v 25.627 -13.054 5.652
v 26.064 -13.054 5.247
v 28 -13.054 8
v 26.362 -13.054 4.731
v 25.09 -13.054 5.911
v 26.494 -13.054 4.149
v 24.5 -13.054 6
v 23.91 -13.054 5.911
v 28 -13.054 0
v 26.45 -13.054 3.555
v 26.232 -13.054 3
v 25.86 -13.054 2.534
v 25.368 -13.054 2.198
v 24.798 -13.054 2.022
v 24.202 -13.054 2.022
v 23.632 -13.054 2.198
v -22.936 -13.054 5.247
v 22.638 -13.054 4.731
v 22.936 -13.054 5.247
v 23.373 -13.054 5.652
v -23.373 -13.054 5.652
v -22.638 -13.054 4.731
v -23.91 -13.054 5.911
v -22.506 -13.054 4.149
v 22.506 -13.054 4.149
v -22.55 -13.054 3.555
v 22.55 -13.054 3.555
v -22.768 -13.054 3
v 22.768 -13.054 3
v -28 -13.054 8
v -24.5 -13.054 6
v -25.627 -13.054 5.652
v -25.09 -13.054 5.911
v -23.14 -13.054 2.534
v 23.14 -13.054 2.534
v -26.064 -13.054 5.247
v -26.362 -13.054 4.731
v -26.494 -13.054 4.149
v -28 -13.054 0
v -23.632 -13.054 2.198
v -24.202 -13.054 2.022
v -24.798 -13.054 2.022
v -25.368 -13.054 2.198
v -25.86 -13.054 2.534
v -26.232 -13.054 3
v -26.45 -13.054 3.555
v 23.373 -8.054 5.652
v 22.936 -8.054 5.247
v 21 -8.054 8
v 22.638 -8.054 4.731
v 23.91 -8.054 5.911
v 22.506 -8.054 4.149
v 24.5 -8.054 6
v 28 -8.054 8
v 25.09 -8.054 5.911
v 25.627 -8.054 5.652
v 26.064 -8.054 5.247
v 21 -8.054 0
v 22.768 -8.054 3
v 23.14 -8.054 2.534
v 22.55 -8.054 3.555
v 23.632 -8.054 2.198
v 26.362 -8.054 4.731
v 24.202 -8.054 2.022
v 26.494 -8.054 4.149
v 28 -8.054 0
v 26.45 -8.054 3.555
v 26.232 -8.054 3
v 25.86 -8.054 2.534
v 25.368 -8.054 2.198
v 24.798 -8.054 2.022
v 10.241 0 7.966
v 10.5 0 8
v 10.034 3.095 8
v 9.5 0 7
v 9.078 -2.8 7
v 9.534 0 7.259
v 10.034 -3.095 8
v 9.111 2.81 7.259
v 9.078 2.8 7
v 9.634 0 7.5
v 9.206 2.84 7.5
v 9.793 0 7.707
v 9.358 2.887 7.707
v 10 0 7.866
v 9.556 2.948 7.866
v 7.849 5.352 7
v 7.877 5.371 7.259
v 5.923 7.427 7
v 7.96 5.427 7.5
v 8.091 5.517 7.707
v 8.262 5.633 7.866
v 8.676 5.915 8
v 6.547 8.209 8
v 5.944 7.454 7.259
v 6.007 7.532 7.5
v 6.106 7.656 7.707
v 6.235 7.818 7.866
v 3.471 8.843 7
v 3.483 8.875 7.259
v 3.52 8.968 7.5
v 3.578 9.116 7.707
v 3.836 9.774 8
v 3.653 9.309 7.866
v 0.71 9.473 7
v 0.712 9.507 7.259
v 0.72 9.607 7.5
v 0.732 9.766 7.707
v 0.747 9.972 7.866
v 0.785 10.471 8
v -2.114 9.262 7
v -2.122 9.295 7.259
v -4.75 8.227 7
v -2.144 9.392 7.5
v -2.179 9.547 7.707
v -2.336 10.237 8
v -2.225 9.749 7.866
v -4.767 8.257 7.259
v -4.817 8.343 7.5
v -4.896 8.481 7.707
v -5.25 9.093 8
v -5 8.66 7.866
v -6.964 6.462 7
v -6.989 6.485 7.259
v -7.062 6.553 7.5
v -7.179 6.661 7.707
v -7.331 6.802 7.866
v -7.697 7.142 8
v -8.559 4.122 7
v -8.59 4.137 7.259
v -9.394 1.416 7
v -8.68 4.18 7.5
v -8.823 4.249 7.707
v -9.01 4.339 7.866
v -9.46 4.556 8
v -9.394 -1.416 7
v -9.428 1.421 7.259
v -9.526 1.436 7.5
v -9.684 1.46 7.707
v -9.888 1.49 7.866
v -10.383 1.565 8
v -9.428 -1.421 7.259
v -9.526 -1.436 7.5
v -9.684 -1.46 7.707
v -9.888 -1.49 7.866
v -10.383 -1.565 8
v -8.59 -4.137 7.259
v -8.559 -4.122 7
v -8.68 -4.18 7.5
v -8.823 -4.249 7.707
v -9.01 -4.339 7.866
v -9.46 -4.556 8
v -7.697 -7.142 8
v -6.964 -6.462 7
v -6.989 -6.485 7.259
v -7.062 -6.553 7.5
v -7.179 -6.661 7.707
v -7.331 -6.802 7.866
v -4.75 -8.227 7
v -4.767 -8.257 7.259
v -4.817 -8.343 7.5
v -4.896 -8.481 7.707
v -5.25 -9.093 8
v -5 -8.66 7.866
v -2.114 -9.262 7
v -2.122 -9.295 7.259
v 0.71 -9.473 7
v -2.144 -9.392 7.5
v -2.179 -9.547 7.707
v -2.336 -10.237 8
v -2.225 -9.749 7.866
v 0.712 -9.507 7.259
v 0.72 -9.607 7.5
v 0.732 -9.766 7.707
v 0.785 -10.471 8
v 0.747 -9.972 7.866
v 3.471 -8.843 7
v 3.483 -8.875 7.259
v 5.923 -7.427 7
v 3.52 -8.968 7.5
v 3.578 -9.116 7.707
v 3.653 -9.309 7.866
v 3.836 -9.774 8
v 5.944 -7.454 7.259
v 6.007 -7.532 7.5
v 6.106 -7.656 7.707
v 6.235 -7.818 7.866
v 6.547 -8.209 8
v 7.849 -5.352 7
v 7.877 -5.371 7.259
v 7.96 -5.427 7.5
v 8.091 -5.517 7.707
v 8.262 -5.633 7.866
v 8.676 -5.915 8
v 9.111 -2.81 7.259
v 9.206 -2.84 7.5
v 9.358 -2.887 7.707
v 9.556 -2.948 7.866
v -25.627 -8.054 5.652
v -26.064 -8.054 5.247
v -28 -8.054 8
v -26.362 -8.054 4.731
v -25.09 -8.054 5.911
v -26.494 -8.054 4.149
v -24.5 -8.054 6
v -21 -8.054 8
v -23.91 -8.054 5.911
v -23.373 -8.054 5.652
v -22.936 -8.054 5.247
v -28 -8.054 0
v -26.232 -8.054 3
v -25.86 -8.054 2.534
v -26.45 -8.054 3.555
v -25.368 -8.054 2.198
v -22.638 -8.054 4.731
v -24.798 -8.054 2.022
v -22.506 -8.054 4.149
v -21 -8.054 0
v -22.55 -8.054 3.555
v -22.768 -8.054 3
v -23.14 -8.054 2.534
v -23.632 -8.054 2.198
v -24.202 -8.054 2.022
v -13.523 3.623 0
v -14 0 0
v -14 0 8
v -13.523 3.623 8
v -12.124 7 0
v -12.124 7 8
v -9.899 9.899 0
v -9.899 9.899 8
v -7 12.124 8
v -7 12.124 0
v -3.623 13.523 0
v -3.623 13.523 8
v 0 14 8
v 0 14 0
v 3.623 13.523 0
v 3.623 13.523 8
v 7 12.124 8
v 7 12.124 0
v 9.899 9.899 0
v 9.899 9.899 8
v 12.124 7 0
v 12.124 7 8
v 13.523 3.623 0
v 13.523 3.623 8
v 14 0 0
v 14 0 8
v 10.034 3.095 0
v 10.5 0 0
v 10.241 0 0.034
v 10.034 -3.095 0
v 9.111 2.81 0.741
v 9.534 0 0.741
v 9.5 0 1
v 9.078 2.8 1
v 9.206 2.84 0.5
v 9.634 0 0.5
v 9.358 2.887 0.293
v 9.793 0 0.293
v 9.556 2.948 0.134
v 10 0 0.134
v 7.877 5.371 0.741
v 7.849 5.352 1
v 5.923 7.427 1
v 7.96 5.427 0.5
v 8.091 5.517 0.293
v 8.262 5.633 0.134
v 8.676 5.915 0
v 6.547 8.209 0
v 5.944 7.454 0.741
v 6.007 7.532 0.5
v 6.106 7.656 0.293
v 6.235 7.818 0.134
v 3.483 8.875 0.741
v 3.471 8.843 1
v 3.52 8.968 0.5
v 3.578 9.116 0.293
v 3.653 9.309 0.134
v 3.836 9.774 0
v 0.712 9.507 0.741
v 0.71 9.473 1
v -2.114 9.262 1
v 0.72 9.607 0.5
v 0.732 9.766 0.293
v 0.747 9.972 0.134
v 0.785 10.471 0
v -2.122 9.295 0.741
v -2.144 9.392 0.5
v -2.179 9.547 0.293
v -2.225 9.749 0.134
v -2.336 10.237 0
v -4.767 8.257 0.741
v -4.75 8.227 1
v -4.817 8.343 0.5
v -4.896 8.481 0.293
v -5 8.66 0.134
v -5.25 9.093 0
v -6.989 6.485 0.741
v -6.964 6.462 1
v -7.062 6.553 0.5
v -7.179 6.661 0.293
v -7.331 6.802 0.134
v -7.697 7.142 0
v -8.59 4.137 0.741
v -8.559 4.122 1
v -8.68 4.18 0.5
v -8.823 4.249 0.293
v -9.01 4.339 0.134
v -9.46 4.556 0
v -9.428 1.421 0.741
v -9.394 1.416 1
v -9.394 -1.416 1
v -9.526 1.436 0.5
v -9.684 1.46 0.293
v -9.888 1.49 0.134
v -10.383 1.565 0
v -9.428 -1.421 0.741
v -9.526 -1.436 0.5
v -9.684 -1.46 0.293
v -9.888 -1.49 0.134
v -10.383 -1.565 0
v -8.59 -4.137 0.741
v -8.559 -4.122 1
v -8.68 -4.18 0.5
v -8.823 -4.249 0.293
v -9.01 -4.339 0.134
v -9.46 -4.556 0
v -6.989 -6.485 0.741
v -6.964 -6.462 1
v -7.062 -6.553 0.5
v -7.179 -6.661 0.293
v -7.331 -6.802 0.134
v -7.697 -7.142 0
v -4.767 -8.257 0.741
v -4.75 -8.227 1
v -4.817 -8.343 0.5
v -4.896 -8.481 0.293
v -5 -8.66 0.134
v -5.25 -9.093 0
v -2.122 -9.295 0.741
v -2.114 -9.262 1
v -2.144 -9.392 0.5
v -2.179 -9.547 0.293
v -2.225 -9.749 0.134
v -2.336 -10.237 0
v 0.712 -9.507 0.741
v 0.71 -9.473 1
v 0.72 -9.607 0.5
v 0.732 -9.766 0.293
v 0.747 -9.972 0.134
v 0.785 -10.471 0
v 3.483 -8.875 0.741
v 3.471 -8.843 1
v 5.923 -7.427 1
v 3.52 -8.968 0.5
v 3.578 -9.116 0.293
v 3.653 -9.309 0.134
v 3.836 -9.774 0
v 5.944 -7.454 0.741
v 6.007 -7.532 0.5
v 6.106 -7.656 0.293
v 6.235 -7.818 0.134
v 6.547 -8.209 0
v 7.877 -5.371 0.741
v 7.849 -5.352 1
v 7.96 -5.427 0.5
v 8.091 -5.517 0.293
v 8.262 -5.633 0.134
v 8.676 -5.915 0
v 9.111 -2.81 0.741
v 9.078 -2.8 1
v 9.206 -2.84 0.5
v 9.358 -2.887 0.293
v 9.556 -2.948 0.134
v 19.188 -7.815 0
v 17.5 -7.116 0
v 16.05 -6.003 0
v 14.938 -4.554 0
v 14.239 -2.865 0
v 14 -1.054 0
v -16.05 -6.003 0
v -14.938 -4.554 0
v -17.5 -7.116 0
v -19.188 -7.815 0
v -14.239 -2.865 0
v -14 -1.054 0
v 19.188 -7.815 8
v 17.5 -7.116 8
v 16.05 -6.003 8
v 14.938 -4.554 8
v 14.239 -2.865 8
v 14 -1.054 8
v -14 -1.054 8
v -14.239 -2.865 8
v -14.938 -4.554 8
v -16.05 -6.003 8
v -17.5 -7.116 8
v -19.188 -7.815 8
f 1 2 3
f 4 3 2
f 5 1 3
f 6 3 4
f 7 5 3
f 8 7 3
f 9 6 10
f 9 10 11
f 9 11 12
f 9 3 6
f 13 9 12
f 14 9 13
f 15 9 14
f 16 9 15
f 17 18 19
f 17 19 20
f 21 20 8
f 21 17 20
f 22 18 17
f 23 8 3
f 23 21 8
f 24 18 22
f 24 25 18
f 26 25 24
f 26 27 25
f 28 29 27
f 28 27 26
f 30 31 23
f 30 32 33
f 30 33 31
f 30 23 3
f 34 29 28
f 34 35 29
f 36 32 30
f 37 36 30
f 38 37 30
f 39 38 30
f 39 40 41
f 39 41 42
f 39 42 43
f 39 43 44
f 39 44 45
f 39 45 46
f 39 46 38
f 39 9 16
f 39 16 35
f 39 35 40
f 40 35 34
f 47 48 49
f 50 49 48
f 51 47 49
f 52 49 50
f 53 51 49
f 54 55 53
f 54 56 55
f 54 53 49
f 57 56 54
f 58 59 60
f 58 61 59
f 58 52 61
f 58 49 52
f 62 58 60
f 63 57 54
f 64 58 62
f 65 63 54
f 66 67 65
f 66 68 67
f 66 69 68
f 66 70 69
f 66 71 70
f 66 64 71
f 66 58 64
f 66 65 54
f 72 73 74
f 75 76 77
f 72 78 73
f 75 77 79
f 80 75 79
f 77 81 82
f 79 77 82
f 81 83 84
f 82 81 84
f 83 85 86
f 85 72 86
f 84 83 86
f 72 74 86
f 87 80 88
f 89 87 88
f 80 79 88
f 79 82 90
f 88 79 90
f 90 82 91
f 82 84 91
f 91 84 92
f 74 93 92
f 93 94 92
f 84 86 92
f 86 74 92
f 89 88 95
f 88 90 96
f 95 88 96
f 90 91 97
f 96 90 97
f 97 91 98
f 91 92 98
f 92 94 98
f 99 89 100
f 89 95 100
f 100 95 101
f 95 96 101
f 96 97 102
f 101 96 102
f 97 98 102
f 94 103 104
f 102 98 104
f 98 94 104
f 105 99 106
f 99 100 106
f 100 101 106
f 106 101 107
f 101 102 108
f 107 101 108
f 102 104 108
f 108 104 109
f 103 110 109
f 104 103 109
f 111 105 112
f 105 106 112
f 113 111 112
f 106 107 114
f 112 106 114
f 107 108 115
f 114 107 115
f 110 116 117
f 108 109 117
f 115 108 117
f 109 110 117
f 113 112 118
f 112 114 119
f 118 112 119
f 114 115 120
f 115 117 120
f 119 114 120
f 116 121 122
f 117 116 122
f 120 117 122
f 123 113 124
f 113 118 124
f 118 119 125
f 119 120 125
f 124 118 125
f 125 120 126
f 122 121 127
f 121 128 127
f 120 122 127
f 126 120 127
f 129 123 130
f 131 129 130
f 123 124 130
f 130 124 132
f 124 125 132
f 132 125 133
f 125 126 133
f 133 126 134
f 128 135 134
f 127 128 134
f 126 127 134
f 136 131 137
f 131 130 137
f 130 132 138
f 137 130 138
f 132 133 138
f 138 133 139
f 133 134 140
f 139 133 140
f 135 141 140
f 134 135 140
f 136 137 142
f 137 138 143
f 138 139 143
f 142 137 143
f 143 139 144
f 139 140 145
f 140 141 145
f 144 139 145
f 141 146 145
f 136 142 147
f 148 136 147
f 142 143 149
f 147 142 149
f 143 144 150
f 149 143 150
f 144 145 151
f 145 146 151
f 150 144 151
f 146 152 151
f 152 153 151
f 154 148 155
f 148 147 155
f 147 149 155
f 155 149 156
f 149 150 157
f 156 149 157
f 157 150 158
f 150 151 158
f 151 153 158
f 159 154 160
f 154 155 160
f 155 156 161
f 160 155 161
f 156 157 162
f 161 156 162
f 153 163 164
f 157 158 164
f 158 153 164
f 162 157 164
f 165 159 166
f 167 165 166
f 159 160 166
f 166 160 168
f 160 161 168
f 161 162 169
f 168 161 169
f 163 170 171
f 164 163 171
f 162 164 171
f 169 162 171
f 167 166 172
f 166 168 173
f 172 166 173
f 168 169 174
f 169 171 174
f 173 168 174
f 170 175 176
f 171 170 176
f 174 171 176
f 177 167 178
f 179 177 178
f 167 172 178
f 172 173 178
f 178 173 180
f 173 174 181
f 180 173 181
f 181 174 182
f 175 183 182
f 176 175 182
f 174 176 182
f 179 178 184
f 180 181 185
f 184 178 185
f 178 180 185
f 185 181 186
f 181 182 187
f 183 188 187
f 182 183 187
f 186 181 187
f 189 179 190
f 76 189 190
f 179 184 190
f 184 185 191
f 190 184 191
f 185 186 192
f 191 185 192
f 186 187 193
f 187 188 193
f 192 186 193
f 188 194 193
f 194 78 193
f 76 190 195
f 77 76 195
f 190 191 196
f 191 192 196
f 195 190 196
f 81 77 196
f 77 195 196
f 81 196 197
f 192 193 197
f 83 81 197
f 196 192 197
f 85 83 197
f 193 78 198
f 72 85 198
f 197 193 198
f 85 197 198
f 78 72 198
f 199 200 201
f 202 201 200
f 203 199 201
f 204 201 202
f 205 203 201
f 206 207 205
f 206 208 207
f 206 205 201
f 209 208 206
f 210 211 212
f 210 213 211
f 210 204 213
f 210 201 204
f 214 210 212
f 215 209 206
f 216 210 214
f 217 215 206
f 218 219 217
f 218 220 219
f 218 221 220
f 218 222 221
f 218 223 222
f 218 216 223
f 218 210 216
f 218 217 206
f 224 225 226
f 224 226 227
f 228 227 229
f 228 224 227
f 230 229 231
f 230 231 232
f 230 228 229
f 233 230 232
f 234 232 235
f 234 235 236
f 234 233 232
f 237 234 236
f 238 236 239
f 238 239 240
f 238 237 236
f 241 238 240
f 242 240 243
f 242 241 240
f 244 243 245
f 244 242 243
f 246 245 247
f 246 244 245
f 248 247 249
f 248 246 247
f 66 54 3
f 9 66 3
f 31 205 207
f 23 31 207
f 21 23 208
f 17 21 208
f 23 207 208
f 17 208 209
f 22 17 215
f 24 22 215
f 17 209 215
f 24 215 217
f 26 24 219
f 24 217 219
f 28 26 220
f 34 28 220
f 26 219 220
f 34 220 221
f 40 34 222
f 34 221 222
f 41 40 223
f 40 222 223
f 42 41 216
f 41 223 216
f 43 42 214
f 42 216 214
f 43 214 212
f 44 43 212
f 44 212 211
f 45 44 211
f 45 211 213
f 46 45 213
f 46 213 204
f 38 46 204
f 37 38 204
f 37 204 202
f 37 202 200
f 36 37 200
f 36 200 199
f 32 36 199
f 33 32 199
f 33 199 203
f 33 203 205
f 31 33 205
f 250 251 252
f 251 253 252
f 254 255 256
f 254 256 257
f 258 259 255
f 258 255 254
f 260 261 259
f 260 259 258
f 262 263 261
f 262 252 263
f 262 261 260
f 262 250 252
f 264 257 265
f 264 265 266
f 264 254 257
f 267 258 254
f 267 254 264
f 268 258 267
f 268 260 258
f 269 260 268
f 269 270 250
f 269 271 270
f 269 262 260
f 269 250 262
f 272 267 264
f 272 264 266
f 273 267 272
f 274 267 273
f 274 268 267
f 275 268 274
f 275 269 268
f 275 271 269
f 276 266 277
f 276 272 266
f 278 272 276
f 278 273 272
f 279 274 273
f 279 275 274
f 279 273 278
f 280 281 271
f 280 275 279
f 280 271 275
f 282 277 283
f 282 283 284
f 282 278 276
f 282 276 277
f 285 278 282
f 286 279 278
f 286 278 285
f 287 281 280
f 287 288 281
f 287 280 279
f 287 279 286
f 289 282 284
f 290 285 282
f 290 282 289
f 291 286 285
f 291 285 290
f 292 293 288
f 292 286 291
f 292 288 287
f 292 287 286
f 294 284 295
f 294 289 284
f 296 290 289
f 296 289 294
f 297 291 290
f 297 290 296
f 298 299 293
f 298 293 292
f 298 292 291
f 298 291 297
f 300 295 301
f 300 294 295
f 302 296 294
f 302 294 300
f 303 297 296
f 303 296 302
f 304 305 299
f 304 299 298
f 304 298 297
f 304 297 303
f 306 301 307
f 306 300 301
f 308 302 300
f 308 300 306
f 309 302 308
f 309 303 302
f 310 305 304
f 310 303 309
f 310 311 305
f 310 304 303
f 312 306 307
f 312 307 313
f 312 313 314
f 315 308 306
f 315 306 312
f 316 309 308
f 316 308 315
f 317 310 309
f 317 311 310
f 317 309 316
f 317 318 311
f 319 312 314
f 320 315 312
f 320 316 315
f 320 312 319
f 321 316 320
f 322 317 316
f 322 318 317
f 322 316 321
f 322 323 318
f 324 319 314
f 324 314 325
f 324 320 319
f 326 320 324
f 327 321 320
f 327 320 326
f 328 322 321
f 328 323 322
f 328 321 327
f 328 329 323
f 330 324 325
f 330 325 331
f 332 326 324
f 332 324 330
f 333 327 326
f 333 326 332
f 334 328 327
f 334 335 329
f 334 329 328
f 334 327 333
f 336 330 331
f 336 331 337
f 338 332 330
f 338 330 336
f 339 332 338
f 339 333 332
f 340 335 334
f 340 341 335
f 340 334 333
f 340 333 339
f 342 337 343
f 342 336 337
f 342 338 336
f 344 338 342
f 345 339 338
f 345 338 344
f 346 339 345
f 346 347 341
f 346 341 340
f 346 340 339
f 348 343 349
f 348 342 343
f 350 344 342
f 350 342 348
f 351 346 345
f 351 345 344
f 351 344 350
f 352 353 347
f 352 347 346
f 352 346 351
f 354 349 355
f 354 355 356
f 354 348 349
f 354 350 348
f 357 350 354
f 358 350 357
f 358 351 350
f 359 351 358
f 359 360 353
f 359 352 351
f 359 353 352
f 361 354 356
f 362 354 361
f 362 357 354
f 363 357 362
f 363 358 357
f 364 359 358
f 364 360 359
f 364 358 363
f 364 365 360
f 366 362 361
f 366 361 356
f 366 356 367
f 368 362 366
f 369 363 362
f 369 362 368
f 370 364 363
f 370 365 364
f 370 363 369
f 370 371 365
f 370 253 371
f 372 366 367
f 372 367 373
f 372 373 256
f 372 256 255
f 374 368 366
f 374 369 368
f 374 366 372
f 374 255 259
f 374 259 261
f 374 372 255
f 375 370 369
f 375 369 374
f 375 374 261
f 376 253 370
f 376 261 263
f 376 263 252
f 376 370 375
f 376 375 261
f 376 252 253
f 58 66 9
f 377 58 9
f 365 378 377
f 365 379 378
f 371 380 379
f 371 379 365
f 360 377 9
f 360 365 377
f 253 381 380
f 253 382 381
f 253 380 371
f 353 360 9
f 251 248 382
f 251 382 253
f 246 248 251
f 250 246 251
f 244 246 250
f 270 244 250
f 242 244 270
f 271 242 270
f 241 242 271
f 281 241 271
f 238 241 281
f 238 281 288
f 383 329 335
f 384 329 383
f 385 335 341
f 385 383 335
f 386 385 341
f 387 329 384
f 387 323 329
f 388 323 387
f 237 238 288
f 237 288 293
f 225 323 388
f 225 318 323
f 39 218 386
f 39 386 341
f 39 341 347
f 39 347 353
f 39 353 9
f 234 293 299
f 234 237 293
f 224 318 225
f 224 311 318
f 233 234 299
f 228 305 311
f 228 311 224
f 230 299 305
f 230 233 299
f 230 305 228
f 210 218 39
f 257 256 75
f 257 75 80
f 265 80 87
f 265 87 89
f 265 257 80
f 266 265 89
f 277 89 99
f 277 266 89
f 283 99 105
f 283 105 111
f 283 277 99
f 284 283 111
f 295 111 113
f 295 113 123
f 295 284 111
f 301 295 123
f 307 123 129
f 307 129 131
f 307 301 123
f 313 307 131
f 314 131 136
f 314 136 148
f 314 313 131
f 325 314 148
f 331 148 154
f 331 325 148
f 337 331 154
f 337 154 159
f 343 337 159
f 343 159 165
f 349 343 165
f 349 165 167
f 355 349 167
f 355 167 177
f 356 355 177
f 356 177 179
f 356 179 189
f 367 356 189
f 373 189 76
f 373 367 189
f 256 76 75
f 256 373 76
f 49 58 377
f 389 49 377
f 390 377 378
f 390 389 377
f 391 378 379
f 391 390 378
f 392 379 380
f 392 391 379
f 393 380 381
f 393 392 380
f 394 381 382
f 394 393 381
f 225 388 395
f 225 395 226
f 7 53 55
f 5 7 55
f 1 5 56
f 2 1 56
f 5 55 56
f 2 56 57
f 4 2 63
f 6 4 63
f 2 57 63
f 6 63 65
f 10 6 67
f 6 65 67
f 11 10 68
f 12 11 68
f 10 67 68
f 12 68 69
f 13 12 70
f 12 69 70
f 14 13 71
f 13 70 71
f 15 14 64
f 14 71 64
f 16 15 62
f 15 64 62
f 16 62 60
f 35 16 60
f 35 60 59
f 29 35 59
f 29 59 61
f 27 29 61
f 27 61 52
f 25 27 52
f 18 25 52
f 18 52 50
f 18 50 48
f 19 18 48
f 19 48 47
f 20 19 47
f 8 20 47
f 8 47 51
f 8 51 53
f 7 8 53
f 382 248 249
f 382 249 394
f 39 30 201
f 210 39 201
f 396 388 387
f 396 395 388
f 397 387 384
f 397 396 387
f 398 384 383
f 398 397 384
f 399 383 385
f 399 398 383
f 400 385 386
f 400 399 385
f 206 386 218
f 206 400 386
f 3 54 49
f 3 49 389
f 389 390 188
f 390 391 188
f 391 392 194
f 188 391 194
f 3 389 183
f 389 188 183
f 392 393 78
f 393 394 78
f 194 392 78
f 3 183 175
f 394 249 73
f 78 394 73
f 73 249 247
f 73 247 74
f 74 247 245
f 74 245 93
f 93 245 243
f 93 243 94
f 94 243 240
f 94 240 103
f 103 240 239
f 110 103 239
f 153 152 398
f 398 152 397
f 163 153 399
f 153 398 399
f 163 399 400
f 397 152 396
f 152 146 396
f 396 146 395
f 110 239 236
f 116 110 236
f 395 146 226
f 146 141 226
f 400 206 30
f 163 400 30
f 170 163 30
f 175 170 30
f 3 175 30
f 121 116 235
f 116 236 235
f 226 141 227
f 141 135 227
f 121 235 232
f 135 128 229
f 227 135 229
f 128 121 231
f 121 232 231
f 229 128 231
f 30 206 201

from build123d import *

# Parameters (mm, degrees)
ESQUISSE1_R             = 9.5
BOSS_EXTRU_1_DEPTH      = 8
CONG_1_R                = 1
CONG_2_R                = 1
CONG_3_R                = 7
ESQUISSE2_R             = 2
ENL_V_MAT_EXTRU_1_DEPTH = 6


with BuildPart() as part:
    # Esquisse1 → Boss.-Extru.1 (new body)
    with BuildSketch(Plane.XY):
        with BuildLine():
            Line((14, -8.053746339), (28, -8.053746339))
            Line((28, -8.053746339), (28, -13.053746339))
            Line((28, -13.053746339), (-28, -13.053746339))
            Line((-28, -13.053746339), (-28, -8.053746339))
            Line((-28, -8.053746339), (-14, -8.053746339))
            Line((-14, -8.053746339), (-14, 0))
            ThreePointArc((-14, 0), (0, 14), (14, 0))
            Line((14, 0), (14, -8.053746339))
        make_face()
        Circle(ESQUISSE1_R, mode=Mode.SUBTRACT)
    extrude(amount=BOSS_EXTRU_1_DEPTH)

    # Congé1
    cong_1_edges = [part.edges().sort_by_distance(p)[0] for p in [
        (-9.5, 0, 8),
    ]]
    fillet(cong_1_edges, radius=CONG_1_R)

    # Congé2
    cong_2_edges = [part.edges().sort_by_distance(p)[0] for p in [
        (-9.5, 0, 0),
    ]]
    fillet(cong_2_edges, radius=CONG_2_R)

    # Congé3
    cong_3_edges = [part.edges().sort_by_distance(p)[0] for p in [
        (-14, -8.053746339, 4),
        (14, -8.053746339, 4),
    ]]
    fillet(cong_3_edges, radius=CONG_3_R)

    # Esquisse2 → Enlèv. mat.-Extru.1 (cut)
    with BuildSketch(Plane(origin=(0, -8.053746339, 0), x_dir=(1, 0, 0), z_dir=(0, 1, 0))):
        with Locations(Location((24.5, -4, 0), (0, 0, 270))):
            Circle(ESQUISSE2_R)
        with Locations(Location((-24.5, -4, 0), (0, 0, 270))):
            Circle(ESQUISSE2_R)
    extrude(amount=-ENL_V_MAT_EXTRU_1_DEPTH, mode=Mode.SUBTRACT)


solid = part.part
